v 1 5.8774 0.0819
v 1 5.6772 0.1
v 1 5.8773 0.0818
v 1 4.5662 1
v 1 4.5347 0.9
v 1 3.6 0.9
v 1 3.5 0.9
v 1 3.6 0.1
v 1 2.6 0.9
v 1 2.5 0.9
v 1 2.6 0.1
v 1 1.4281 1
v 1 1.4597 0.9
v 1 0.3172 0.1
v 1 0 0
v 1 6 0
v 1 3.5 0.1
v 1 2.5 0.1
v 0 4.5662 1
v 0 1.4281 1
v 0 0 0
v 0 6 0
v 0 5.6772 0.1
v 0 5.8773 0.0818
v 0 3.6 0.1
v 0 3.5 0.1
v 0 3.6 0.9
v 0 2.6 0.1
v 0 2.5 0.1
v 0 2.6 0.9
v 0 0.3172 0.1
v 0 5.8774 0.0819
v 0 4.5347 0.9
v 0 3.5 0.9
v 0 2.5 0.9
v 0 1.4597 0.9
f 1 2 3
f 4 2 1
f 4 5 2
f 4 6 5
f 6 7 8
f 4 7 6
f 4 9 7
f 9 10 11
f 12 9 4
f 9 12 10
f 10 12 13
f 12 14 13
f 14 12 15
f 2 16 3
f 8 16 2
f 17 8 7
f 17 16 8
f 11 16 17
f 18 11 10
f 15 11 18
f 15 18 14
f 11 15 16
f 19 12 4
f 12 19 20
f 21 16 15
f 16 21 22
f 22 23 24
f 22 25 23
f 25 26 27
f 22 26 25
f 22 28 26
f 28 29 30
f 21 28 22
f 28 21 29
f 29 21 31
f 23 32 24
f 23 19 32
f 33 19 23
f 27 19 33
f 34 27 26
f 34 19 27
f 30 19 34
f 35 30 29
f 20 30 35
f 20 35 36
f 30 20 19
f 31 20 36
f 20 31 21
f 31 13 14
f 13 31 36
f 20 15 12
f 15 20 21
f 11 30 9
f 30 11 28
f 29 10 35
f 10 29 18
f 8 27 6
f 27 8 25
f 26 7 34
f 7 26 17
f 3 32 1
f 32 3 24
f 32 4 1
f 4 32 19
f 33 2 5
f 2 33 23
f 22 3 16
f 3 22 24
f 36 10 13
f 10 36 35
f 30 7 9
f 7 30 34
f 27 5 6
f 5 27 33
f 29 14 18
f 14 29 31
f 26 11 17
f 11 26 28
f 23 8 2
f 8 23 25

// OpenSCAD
Bridge_Width=1;
Bridge_Height=1;
Thickness=.1;
Inner_Height=Bridge_Height-Thickness*2;
Distance_1=0;
Distance_2=2.5;
Distance_3=3.5;
Distance_4=5.82;
Angle_1=-55;
Angle_2=0;
Angle_3=-0;
Angle_4=55;

union() {
intersection(){
cube(size=[Bridge_Width,6,Bridge_Height], center=false);

translate([0,Distance_1,0]) 
rotate([Angle_1, 0, 0])
cube(size=[Bridge_Width,Thickness,6]);
}
intersection(){
cube(size=[Bridge_Width,6,Bridge_Height], center=false);
translate([0,Distance_2,]) 
rotate([Angle_2, 0, 0])
cube(size=[Bridge_Width,Thickness,6]);
}
intersection(){
cube(size=[Bridge_Width,6,Bridge_Height], center=false);
translate([0,Distance_3,0]) 
rotate([Angle_3, 0, 0])
cube(size=[Bridge_Width,Thickness,6]);
}
intersection(){
cube(size=[Bridge_Width,6,Bridge_Height], center=false);
translate([0,Distance_4,0]) 
rotate([Angle_4, 0, 0])
cube(size=[Bridge_Width,Thickness,6]);
}
  difference()
  {
 polyhedron(
  points=[[0,0,0],
          [Bridge_Width,0,0],
          [Bridge_Width,6,0],
          [0,6,0], // base
          [0,1.5,Bridge_Height],
          [Bridge_Width,1.5,Bridge_Height],
          [Bridge_Width,4.5,Bridge_Height],
          [0,4.5,Bridge_Height]], // top 
  faces=[ [0,1,2,3], // bottom
          [4,5,1,0], // front
          [7,6,5,4], // top
          [5,6,2,1], // right
          [6,7,3,2], // back
          [7,4,0,3] ] // left
 );
      translate([-.5,0,Thickness]) 
          cube(size=[4,7,Inner_Height],center=false);
      
  }
  }
